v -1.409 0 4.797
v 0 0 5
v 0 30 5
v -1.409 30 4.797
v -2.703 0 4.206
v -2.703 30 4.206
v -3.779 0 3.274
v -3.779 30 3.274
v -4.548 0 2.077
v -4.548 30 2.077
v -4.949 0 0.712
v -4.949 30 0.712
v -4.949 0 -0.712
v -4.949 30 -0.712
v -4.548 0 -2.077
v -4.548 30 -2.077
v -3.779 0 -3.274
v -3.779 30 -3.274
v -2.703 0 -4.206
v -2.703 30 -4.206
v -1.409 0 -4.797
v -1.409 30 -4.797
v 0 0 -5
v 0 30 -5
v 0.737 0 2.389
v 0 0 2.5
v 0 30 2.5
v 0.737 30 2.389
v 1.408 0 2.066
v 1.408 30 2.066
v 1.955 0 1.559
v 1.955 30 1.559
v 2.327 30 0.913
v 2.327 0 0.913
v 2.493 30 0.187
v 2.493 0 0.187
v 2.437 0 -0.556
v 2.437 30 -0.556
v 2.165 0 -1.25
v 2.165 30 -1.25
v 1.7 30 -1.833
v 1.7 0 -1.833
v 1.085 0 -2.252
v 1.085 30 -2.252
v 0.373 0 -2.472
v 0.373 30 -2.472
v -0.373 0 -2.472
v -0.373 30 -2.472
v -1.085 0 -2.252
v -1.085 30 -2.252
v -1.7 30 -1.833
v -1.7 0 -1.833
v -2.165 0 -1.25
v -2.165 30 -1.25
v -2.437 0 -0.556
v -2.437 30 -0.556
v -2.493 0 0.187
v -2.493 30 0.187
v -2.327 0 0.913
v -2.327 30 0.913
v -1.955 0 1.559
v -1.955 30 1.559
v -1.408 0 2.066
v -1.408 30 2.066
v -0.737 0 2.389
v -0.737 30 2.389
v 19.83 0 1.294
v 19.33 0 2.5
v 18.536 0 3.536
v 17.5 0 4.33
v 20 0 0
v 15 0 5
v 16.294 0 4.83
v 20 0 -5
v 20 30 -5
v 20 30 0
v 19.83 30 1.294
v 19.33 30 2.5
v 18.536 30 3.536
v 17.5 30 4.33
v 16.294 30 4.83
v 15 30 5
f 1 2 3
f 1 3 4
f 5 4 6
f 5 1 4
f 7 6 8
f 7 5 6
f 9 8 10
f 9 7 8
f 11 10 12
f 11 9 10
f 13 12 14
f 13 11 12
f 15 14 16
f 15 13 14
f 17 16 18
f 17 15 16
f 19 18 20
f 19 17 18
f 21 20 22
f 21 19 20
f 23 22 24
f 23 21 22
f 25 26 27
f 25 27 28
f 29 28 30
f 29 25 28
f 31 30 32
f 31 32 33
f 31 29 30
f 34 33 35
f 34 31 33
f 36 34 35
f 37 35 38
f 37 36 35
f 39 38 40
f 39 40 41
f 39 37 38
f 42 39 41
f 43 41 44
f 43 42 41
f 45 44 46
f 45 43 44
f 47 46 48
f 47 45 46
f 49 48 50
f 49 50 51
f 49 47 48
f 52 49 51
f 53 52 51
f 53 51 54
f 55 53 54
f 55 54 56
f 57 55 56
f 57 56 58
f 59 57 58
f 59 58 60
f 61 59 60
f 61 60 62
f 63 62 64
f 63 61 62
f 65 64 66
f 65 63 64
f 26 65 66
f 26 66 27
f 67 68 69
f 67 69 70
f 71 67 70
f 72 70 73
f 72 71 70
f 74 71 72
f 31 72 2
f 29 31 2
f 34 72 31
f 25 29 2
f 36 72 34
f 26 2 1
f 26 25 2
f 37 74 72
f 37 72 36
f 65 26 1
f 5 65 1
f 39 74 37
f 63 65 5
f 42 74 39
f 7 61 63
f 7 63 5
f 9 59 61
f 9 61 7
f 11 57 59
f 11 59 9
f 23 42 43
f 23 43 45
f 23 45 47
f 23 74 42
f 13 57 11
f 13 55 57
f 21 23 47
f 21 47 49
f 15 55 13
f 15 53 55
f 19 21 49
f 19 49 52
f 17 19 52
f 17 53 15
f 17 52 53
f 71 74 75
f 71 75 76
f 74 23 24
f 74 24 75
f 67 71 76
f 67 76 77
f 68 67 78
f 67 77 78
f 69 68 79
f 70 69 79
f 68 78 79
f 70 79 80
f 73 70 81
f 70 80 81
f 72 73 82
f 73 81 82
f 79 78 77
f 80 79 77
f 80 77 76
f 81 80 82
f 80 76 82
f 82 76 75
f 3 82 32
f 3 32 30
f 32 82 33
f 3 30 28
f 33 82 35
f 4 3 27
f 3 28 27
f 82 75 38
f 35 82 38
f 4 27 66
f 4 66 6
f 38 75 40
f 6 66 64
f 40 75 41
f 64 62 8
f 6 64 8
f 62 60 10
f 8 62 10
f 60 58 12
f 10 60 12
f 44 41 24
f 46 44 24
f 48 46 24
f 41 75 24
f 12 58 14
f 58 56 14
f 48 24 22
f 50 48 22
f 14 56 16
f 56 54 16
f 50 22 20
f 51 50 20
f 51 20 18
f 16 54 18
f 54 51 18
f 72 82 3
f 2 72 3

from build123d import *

# Parameters (mm, degrees)
SKETCH1_R           = 2.5
BOSS_EXTRUDE1_DEPTH = 30
FILLET1_R           = 5


with BuildPart() as part:
    # Sketch1 → Boss-Extrude1 (new body)
    with BuildSketch(Plane(origin=(0, 0, 0), x_dir=(1, 0, 0), z_dir=(0, 1, 0))):
        with BuildLine():
            Line((0, 5), (20, 5))
            Line((20, 5), (20, -5))
            Line((20, -5), (0, -5))
            ThreePointArc((0, -5), (-5, 0), (0, 5))
        make_face()
        with Locations(Location((0, 0, 0), (0, 0, 270))):
            Circle(SKETCH1_R, mode=Mode.SUBTRACT)
    extrude(amount=BOSS_EXTRUDE1_DEPTH)

    # Fillet1
    fillet1_edges = [part.edges().sort_by_distance(p)[0] for p in [
        (20, 15, 5),
    ]]
    fillet(fillet1_edges, radius=FILLET1_R)


solid = part.part
